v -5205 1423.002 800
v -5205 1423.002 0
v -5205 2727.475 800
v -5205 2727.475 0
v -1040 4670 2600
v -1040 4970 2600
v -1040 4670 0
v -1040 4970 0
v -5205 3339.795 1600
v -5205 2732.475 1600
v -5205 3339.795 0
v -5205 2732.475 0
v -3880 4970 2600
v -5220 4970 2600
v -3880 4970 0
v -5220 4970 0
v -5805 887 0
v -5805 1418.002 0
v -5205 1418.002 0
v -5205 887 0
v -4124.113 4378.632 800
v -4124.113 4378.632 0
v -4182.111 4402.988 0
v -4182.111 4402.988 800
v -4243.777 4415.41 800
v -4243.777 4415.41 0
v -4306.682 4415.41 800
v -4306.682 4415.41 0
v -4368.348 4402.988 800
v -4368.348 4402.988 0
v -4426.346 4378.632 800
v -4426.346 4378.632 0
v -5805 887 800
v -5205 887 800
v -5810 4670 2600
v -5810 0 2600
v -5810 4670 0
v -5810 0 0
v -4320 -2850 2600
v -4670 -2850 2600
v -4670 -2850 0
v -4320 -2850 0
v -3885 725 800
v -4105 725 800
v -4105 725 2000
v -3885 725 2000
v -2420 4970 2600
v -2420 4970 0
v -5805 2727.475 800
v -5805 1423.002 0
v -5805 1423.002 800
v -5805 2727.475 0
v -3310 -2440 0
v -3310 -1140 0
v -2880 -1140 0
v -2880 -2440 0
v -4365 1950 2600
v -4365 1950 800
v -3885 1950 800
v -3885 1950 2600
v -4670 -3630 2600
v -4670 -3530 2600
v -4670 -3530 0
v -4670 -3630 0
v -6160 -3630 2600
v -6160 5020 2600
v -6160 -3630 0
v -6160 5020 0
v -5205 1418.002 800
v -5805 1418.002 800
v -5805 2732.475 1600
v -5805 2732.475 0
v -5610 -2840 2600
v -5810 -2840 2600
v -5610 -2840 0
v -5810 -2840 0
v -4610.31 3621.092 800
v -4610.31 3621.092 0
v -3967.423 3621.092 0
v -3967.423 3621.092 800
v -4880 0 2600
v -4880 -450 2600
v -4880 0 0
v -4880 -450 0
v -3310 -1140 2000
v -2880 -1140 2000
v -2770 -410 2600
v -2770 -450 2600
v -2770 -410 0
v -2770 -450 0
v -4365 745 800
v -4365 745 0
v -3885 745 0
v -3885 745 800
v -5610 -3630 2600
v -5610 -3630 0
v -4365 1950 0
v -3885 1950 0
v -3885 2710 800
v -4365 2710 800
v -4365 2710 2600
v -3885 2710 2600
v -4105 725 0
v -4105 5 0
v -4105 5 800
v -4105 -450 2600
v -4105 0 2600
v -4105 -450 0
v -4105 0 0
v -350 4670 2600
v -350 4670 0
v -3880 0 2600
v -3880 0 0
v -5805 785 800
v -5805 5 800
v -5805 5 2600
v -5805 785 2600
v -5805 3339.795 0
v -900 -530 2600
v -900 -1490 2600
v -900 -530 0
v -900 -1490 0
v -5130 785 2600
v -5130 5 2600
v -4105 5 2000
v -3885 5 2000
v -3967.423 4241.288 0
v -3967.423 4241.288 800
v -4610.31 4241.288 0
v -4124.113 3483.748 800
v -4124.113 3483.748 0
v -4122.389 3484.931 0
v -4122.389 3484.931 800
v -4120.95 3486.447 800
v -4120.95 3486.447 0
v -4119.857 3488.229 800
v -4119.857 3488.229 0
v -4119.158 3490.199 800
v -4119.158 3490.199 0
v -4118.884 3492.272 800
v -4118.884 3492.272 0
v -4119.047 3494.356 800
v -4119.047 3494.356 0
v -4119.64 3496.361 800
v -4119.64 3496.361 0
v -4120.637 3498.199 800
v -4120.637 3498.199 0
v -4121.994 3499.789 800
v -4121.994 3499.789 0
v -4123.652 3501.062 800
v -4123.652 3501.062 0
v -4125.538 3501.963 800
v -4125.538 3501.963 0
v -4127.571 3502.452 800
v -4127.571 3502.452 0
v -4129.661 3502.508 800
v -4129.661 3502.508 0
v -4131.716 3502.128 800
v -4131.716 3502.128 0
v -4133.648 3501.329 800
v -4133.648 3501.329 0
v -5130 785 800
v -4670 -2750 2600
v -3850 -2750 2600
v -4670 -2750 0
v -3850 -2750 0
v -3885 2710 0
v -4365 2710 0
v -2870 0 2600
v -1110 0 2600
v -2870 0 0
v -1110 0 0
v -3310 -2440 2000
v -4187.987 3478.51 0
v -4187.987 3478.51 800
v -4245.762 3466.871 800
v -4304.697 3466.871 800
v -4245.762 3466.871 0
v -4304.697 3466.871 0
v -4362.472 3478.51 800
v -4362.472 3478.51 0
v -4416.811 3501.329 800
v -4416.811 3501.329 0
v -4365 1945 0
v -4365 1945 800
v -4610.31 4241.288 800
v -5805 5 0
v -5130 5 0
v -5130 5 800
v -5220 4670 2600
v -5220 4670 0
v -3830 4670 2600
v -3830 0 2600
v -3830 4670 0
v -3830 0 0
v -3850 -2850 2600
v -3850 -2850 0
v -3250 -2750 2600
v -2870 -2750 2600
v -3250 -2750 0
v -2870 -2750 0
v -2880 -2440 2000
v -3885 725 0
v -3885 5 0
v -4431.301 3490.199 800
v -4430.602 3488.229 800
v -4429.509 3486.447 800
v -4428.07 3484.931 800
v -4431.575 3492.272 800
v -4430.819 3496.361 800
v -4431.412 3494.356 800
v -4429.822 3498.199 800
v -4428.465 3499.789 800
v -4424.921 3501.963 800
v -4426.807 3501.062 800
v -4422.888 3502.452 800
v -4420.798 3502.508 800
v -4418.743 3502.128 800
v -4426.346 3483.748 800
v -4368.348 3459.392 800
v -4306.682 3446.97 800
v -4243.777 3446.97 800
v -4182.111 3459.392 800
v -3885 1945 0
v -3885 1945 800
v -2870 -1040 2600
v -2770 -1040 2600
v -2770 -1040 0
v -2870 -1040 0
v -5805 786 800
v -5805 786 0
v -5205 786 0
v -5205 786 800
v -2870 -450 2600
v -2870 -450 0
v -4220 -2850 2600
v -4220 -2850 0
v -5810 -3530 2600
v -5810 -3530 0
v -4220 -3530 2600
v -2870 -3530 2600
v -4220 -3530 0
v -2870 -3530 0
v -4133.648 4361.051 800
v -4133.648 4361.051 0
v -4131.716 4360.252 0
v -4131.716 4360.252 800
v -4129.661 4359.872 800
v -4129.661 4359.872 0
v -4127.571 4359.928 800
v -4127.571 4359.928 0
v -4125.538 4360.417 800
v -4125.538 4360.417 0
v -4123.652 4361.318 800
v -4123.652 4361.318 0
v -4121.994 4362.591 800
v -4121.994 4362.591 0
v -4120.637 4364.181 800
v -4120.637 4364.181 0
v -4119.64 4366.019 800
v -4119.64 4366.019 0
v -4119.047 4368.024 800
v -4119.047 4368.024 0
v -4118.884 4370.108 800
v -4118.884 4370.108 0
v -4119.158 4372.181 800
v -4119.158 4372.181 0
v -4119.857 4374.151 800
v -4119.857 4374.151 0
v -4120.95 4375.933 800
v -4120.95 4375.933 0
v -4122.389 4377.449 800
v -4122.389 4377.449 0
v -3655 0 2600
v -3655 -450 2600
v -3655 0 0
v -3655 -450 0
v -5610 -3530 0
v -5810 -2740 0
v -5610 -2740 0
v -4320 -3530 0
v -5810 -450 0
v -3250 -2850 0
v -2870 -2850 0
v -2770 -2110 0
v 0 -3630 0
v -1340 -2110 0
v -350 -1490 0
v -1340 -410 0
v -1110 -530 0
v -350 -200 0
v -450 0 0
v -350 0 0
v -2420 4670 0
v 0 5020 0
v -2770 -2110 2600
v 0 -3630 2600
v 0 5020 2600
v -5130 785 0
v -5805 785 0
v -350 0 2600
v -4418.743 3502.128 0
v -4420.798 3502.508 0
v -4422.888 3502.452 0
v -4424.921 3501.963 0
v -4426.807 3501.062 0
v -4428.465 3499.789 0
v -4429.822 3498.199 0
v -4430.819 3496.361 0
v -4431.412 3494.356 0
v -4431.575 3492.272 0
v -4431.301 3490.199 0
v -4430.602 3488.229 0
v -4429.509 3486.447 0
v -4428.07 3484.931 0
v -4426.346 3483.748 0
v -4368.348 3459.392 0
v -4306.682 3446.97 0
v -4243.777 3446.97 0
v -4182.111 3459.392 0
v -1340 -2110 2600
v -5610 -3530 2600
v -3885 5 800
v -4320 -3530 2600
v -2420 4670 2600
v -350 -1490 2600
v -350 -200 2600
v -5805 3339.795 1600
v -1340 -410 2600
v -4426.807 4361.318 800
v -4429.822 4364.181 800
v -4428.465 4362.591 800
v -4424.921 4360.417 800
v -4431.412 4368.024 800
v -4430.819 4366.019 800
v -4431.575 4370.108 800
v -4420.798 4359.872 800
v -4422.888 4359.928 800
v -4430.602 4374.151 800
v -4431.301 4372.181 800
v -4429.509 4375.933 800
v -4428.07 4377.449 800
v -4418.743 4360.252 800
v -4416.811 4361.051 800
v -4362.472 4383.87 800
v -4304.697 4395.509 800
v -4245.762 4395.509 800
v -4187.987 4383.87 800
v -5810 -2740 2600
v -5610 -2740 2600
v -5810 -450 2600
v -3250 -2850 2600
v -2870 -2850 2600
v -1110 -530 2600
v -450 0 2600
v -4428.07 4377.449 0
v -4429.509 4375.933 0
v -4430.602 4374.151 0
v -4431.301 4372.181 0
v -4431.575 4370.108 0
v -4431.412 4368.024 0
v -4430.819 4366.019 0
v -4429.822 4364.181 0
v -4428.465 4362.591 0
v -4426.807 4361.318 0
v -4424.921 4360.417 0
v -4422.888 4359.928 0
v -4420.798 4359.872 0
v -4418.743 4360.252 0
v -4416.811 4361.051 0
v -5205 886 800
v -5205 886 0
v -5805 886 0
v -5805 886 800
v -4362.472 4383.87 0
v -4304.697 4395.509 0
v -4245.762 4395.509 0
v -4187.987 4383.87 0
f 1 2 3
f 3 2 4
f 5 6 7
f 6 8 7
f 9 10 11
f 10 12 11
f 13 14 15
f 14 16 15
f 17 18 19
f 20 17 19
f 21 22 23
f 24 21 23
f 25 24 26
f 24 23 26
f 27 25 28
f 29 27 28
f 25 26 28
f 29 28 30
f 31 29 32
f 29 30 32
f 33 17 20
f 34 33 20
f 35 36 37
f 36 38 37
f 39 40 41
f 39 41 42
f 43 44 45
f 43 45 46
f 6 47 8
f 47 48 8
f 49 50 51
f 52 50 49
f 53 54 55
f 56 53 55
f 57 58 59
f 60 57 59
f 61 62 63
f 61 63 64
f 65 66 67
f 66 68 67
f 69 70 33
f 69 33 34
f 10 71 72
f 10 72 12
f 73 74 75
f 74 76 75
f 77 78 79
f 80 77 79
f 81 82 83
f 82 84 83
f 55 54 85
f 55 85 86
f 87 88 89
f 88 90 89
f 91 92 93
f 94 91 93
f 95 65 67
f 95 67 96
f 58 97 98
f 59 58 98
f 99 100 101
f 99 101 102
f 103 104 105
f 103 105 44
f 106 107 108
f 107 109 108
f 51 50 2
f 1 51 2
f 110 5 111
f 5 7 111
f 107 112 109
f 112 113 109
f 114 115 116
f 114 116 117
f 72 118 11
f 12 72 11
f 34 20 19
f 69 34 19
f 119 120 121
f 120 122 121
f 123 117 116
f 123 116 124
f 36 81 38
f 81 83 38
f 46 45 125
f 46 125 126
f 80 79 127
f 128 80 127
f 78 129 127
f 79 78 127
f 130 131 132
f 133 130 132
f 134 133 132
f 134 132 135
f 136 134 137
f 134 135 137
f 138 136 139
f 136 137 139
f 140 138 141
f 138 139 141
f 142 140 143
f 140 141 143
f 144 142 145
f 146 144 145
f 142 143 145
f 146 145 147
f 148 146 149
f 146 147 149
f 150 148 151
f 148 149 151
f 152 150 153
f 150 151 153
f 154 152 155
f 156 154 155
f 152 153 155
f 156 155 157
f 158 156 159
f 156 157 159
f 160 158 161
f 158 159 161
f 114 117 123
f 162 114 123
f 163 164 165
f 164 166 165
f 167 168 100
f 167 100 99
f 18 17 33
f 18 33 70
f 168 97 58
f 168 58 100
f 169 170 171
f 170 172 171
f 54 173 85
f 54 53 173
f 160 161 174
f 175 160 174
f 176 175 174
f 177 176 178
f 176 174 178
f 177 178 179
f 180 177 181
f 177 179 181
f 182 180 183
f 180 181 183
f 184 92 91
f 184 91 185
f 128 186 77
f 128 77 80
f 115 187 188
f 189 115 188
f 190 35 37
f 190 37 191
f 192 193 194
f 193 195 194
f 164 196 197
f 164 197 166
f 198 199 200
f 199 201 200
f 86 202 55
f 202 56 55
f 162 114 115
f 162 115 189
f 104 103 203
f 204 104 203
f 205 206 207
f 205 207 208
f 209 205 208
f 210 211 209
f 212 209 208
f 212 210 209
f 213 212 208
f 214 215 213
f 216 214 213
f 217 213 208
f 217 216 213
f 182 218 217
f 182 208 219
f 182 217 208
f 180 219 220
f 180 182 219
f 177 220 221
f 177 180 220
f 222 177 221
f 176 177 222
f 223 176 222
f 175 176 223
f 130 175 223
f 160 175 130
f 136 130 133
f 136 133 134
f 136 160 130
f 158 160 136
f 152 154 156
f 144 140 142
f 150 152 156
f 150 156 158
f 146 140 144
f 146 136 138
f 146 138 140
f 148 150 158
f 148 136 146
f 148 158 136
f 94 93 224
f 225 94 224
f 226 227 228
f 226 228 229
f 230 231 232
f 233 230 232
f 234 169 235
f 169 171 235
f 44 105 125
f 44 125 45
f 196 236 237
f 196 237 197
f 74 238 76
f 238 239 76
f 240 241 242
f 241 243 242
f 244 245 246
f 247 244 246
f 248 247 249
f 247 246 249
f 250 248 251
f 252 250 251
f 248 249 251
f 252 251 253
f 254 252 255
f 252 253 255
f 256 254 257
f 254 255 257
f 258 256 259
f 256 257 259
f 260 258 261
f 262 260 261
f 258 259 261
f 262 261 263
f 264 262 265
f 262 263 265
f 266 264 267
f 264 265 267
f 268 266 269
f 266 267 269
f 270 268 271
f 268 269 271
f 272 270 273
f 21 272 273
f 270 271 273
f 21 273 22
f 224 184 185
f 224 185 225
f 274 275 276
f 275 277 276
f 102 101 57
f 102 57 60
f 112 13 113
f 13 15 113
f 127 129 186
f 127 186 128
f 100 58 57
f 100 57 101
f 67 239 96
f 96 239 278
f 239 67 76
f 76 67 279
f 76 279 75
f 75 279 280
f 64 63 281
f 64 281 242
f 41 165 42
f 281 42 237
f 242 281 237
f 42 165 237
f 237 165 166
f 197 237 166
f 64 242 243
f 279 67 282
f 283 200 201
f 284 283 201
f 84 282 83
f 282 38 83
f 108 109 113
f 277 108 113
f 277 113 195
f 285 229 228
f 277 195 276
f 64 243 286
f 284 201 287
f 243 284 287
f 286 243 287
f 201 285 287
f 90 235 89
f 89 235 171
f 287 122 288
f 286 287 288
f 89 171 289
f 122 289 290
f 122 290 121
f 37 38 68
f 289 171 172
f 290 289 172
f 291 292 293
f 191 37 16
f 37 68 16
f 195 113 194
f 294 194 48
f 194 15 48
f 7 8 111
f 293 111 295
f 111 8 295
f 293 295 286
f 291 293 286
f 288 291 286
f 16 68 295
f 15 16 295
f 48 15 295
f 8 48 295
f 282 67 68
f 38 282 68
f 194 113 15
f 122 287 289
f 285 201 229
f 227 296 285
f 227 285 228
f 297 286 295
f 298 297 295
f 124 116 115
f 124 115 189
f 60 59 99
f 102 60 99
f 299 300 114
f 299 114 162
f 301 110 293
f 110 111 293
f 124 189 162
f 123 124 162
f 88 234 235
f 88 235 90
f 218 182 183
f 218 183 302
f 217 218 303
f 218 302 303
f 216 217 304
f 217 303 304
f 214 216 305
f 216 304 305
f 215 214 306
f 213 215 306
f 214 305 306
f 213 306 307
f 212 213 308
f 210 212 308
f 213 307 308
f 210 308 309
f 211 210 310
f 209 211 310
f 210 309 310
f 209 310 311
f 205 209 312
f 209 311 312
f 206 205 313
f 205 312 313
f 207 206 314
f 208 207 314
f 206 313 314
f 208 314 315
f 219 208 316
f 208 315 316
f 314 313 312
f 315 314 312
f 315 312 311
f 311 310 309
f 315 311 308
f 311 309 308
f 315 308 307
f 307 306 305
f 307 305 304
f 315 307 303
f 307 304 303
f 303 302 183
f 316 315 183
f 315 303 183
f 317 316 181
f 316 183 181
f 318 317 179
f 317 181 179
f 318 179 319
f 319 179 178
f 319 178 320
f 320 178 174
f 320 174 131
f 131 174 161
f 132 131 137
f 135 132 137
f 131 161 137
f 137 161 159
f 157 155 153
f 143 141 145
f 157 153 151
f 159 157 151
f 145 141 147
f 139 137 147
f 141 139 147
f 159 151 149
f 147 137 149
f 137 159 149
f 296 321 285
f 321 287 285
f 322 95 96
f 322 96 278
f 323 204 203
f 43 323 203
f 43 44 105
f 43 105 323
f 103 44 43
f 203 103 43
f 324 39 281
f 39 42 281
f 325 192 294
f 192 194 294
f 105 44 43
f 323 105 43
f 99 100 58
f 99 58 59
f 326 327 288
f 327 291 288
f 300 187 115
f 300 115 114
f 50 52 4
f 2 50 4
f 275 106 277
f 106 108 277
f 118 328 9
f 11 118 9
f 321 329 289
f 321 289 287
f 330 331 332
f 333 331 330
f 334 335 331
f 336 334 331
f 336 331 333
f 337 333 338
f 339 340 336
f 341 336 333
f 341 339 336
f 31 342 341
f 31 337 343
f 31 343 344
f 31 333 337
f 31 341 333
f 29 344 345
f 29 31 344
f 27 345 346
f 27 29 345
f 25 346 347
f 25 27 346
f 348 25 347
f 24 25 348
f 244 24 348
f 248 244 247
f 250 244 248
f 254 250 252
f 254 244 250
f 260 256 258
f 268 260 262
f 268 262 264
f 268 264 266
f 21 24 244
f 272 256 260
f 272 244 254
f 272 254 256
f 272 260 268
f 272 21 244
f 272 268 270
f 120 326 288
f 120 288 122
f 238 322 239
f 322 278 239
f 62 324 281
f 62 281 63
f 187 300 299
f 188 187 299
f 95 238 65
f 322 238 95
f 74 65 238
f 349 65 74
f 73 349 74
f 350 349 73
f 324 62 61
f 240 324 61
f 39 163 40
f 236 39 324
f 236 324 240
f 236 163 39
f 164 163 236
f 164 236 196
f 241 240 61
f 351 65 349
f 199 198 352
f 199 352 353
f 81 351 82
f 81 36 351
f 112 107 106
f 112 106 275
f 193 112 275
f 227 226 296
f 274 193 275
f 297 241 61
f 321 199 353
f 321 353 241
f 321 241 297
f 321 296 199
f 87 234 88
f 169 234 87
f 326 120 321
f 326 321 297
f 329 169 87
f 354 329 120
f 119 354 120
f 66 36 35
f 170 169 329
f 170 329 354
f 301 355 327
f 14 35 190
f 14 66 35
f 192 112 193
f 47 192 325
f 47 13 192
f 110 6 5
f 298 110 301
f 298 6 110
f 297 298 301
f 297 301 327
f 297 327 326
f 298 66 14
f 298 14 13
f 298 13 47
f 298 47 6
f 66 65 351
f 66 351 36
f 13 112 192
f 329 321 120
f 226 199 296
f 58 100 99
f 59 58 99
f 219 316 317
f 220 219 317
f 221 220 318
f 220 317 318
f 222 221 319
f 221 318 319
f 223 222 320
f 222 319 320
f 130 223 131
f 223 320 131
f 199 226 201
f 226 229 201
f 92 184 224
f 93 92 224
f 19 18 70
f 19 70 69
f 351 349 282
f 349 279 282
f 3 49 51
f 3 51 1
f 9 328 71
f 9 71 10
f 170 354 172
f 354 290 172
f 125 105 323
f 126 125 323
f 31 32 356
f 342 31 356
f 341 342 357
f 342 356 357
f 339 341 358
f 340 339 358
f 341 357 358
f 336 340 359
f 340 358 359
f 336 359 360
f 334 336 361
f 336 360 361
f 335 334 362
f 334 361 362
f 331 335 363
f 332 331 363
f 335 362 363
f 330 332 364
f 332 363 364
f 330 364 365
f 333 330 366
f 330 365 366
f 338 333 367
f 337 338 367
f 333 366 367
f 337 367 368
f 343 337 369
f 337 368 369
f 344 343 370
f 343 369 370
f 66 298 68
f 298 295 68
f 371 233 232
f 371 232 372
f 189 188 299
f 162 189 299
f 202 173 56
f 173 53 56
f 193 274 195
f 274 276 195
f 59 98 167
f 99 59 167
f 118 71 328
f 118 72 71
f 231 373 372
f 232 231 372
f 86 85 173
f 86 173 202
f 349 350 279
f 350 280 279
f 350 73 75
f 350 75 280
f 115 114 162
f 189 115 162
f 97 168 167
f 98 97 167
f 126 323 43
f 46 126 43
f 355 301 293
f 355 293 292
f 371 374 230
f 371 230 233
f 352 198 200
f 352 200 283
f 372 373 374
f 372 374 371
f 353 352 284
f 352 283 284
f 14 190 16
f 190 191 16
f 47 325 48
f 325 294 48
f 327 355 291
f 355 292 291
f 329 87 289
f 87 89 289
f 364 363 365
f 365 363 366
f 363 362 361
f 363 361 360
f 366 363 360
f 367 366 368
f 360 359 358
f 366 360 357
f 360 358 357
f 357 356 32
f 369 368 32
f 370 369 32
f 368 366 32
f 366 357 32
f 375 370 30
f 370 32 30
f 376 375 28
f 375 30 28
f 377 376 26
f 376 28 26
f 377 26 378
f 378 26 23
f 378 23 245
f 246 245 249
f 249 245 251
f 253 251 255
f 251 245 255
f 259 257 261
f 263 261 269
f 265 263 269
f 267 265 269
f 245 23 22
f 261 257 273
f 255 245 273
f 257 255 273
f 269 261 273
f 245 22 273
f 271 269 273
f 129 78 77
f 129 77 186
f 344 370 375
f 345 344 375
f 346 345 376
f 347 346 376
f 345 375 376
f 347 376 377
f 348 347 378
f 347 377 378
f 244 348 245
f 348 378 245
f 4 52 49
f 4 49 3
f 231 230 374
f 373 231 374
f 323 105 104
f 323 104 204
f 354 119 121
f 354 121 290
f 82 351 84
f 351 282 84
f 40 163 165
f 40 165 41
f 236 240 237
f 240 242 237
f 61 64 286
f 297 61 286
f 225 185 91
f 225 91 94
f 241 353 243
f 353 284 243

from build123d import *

# Parameters (mm, degrees)
F1_DEPTH = 800
F0_W     = 430
F0_H     = 1300
F0_W_2   = 220
F0_H_2   = 720
F0_W_3   = 480
F0_H_3   = 1200
F0_H_4   = 760
F0_W_4   = 675
F0_H_5   = 780
F0_W_5   = 600
F0_H_6   = 531.0021286011
F0_H_7   = 100
F0_H_8   = 1304.4725608826
F0_H_9   = 607.3201847076
F0_W_6   = 642.8868770599
F0_H_10  = 620.1963424683
F2_DEPTH = 1200
F3_DEPTH = 800
F4_DEPTH = 1800


with BuildPart() as f1:
    # F0 (on Top) → F1 (new body)
    with BuildSketch(Plane.XY):
        Polygon((0, -3630), (0, 5020), (-6160, 5020), (-6160, -3630), (-5810, -3630), (-5610, -3630), (-5610, -3530), (-5810, -3530), (-5810, -2840), (-5610, -2840), (-5610, -2740), (-5810, -2740), (-5810, -450), (-4880, -450), (-4880, 0), (-5810, 0), (-5810, 4670), (-5220, 4670), (-5220, 4970), (-3880, 4970), (-3880, 4670), (-3880, 0), (-4105, 0), (-4105, -450), (-3655, -450), (-3655, 0), (-3830, 0), (-3830, 4670), (-2420, 4670), (-2420, 4970), (-1040, 4970), (-1040, 4670), (-350, 4670), (-350, 0), (-450, 0), (-350, -200), (-350, -1490), (-900, -1490), (-900, -530), (-1110, -530), (-1110, 0), (-2870, 0), (-2870, -450), (-2770, -450), (-2770, -410), (-1340, -410), (-1340, -2110), (-2770, -2110), (-2770, -1040), (-2870, -1040), (-2870, -2750), (-3250, -2750), (-3250, -2850), (-2870, -2850), (-2870, -3530), (-4220, -3530), (-4220, -2850), (-3850, -2850), (-3850, -2750), (-4670, -2750), (-4670, -2850), (-4320, -2850), (-4320, -3530), (-4670, -3530), (-4670, -3630), (-4320, -3630), align=None)
    extrude(amount=F1_DEPTH)

    # F4 (add): a face of the model
    f4_faces = [f1.faces().sort_by_distance(p)[0] for p in [
        (-2581.1160504996, -299.791944949, 800),
    ]]
    extrude(f4_faces, amount=F4_DEPTH)


with BuildPart() as f1b:
    # F0 (on Top) → F1, piece 2 (new body)
    with BuildSketch(Plane.XY):
        with Locations((-3095, -1790)):
            Rectangle(F0_W, F0_H)
    extrude(amount=F1_DEPTH)

    # F2 (add): a face of the model
    f2_faces = [f1b.faces().sort_by_distance(p)[0] for p in [
        (-3095, -1790, 800),
    ]]
    extrude(f2_faces, amount=F2_DEPTH)


with BuildPart() as f1c:
    # F0 (on Top) → F1, piece 3 (new body)
    with BuildSketch(Plane.XY):
        with Locations((-3995, 365)):
            Rectangle(F0_W_2, F0_H_2)
    extrude(amount=F1_DEPTH)


with BuildPart() as f1d:
    # F0 (on Top) → F1, piece 4 (new body)
    with BuildSketch(Plane.XY):
        with Locations((-4125, 1345)):
            Rectangle(F0_W_3, F0_H_3)
    extrude(amount=F1_DEPTH)


with BuildPart() as f1e:
    # F0 (on Top) → F1, piece 5 (new body)
    with BuildSketch(Plane.XY):
        with Locations((-4125, 2330)):
            Rectangle(F0_W_3, F0_H_4)
    extrude(amount=F1_DEPTH)


with BuildPart() as f1f:
    # F0 (on Top) → F1, piece 6 (new body)
    with BuildSketch(Plane.XY):
        with Locations((-5467.5, 395)):
            Rectangle(F0_W_4, F0_H_5)
    extrude(amount=F1_DEPTH)


with BuildPart() as f1g:
    # F0 (on Top) → F1, piece 7 (new body)
    with BuildSketch(Plane.XY):
        with Locations((-5505, 1152.5010643005)):
            Rectangle(F0_W_5, F0_H_6)
    extrude(amount=F1_DEPTH)


with BuildPart() as f1h:
    # F0 (on Top) → F1, piece 8 (new body)
    with BuildSketch(Plane.XY):
        with Locations((-5505, 836)):
            Rectangle(F0_W_5, F0_H_7)
    extrude(amount=F1_DEPTH)


with BuildPart() as f1i:
    # F0 (on Top) → F1, piece 9 (new body)
    with BuildSketch(Plane.XY):
        with Locations((-5505, 2075.2384090424)):
            Rectangle(F0_W_5, F0_H_8)
    extrude(amount=F1_DEPTH)


with BuildPart() as f1j:
    # F0 (on Top) → F1, piece 10 (new body)
    with BuildSketch(Plane.XY):
        with Locations((-5505, 3036.1347818375)):
            Rectangle(F0_W_5, F0_H_9)
    extrude(amount=F1_DEPTH)

    # F3 (add): a face of the model
    f3_faces = [f1j.faces().sort_by_distance(p)[0] for p in [
        (-5505, 3036.1347818375, 800),
    ]]
    extrude(f3_faces, amount=F3_DEPTH)


with BuildPart() as f1k:
    # F0 (on Top) → F1, piece 11 (new body)
    with BuildSketch(Plane.XY):
        with Locations((-4288.8666391373, 3931.1900138855)):
            Rectangle(F0_W_6, F0_H_10)
    extrude(amount=F1_DEPTH)


with BuildPart() as f1l:
    # F0 (on Top) → F1, piece 12 (new body)
    with BuildSketch(Plane.XY):
        with BuildLine():
            ThreePointArc((-4416.8108707663, 3501.328542291), (-4430.368811286, 3497.3058256885), (-4426.3460946835, 3483.7478851687))
            ThreePointArc((-4426.3460946835, 3483.7478851687), (-4275.2294540405, 3445.4055272516), (-4124.1128133976, 3483.7478851687))
            ThreePointArc((-4124.1128133976, 3483.7478851687), (-4120.0900967951, 3497.3058256885), (-4133.6480373148, 3501.328542291))
            ThreePointArc((-4133.6480373148, 3501.328542291), (-4275.2294540405, 3465.4055272516), (-4416.8108707663, 3501.328542291))
        make_face()
    extrude(amount=F1_DEPTH)


with BuildPart() as f1m:
    # F0 (on Top) → F1, piece 13 (new body)
    with BuildSketch(Plane.XY):
        with BuildLine():
            ThreePointArc((-4416.8108707663, 4361.05148548), (-4275.2294540405, 4396.9745005194), (-4133.6480373148, 4361.05148548))
            ThreePointArc((-4133.6480373148, 4361.05148548), (-4120.0900967951, 4365.0742020825), (-4124.1128133976, 4378.6321426022))
            ThreePointArc((-4124.1128133976, 4378.6321426022), (-4275.2294540405, 4416.9745005194), (-4426.3460946835, 4378.6321426022))
            ThreePointArc((-4426.3460946835, 4378.6321426022), (-4430.368811286, 4365.0742020825), (-4416.8108707663, 4361.05148548))
        make_face()
    extrude(amount=F1_DEPTH)


with BuildPart() as f2:
    # F2#2 (new): a face of the model
    f2_2_faces = [f1c.part.faces().sort_by_distance(p)[0] for p in [
        (-3995, 365, 800),
    ]]
    extrude(f2_2_faces, amount=F2_DEPTH)


with BuildPart() as f4:
    # F4#2 (new): a face of the model
    f4_2_faces = [f1f.part.faces().sort_by_distance(p)[0] for p in [
        (-5467.5, 395, 800),
    ]]
    extrude(f4_2_faces, amount=F4_DEPTH)


with BuildPart() as f4b:
    # F4#3 (new): a face of the model
    f4_3_faces = [f1e.part.faces().sort_by_distance(p)[0] for p in [
        (-4125, 2330, 800),
    ]]
    extrude(f4_3_faces, amount=F4_DEPTH)


solid = Compound([f1.part, f1b.part, f1c.part, f1d.part, f1e.part, f1f.part, f1g.part, f1h.part, f1i.part, f1j.part, f1k.part, f1l.part, f1m.part, f2.part, f4.part, f4b.part])
